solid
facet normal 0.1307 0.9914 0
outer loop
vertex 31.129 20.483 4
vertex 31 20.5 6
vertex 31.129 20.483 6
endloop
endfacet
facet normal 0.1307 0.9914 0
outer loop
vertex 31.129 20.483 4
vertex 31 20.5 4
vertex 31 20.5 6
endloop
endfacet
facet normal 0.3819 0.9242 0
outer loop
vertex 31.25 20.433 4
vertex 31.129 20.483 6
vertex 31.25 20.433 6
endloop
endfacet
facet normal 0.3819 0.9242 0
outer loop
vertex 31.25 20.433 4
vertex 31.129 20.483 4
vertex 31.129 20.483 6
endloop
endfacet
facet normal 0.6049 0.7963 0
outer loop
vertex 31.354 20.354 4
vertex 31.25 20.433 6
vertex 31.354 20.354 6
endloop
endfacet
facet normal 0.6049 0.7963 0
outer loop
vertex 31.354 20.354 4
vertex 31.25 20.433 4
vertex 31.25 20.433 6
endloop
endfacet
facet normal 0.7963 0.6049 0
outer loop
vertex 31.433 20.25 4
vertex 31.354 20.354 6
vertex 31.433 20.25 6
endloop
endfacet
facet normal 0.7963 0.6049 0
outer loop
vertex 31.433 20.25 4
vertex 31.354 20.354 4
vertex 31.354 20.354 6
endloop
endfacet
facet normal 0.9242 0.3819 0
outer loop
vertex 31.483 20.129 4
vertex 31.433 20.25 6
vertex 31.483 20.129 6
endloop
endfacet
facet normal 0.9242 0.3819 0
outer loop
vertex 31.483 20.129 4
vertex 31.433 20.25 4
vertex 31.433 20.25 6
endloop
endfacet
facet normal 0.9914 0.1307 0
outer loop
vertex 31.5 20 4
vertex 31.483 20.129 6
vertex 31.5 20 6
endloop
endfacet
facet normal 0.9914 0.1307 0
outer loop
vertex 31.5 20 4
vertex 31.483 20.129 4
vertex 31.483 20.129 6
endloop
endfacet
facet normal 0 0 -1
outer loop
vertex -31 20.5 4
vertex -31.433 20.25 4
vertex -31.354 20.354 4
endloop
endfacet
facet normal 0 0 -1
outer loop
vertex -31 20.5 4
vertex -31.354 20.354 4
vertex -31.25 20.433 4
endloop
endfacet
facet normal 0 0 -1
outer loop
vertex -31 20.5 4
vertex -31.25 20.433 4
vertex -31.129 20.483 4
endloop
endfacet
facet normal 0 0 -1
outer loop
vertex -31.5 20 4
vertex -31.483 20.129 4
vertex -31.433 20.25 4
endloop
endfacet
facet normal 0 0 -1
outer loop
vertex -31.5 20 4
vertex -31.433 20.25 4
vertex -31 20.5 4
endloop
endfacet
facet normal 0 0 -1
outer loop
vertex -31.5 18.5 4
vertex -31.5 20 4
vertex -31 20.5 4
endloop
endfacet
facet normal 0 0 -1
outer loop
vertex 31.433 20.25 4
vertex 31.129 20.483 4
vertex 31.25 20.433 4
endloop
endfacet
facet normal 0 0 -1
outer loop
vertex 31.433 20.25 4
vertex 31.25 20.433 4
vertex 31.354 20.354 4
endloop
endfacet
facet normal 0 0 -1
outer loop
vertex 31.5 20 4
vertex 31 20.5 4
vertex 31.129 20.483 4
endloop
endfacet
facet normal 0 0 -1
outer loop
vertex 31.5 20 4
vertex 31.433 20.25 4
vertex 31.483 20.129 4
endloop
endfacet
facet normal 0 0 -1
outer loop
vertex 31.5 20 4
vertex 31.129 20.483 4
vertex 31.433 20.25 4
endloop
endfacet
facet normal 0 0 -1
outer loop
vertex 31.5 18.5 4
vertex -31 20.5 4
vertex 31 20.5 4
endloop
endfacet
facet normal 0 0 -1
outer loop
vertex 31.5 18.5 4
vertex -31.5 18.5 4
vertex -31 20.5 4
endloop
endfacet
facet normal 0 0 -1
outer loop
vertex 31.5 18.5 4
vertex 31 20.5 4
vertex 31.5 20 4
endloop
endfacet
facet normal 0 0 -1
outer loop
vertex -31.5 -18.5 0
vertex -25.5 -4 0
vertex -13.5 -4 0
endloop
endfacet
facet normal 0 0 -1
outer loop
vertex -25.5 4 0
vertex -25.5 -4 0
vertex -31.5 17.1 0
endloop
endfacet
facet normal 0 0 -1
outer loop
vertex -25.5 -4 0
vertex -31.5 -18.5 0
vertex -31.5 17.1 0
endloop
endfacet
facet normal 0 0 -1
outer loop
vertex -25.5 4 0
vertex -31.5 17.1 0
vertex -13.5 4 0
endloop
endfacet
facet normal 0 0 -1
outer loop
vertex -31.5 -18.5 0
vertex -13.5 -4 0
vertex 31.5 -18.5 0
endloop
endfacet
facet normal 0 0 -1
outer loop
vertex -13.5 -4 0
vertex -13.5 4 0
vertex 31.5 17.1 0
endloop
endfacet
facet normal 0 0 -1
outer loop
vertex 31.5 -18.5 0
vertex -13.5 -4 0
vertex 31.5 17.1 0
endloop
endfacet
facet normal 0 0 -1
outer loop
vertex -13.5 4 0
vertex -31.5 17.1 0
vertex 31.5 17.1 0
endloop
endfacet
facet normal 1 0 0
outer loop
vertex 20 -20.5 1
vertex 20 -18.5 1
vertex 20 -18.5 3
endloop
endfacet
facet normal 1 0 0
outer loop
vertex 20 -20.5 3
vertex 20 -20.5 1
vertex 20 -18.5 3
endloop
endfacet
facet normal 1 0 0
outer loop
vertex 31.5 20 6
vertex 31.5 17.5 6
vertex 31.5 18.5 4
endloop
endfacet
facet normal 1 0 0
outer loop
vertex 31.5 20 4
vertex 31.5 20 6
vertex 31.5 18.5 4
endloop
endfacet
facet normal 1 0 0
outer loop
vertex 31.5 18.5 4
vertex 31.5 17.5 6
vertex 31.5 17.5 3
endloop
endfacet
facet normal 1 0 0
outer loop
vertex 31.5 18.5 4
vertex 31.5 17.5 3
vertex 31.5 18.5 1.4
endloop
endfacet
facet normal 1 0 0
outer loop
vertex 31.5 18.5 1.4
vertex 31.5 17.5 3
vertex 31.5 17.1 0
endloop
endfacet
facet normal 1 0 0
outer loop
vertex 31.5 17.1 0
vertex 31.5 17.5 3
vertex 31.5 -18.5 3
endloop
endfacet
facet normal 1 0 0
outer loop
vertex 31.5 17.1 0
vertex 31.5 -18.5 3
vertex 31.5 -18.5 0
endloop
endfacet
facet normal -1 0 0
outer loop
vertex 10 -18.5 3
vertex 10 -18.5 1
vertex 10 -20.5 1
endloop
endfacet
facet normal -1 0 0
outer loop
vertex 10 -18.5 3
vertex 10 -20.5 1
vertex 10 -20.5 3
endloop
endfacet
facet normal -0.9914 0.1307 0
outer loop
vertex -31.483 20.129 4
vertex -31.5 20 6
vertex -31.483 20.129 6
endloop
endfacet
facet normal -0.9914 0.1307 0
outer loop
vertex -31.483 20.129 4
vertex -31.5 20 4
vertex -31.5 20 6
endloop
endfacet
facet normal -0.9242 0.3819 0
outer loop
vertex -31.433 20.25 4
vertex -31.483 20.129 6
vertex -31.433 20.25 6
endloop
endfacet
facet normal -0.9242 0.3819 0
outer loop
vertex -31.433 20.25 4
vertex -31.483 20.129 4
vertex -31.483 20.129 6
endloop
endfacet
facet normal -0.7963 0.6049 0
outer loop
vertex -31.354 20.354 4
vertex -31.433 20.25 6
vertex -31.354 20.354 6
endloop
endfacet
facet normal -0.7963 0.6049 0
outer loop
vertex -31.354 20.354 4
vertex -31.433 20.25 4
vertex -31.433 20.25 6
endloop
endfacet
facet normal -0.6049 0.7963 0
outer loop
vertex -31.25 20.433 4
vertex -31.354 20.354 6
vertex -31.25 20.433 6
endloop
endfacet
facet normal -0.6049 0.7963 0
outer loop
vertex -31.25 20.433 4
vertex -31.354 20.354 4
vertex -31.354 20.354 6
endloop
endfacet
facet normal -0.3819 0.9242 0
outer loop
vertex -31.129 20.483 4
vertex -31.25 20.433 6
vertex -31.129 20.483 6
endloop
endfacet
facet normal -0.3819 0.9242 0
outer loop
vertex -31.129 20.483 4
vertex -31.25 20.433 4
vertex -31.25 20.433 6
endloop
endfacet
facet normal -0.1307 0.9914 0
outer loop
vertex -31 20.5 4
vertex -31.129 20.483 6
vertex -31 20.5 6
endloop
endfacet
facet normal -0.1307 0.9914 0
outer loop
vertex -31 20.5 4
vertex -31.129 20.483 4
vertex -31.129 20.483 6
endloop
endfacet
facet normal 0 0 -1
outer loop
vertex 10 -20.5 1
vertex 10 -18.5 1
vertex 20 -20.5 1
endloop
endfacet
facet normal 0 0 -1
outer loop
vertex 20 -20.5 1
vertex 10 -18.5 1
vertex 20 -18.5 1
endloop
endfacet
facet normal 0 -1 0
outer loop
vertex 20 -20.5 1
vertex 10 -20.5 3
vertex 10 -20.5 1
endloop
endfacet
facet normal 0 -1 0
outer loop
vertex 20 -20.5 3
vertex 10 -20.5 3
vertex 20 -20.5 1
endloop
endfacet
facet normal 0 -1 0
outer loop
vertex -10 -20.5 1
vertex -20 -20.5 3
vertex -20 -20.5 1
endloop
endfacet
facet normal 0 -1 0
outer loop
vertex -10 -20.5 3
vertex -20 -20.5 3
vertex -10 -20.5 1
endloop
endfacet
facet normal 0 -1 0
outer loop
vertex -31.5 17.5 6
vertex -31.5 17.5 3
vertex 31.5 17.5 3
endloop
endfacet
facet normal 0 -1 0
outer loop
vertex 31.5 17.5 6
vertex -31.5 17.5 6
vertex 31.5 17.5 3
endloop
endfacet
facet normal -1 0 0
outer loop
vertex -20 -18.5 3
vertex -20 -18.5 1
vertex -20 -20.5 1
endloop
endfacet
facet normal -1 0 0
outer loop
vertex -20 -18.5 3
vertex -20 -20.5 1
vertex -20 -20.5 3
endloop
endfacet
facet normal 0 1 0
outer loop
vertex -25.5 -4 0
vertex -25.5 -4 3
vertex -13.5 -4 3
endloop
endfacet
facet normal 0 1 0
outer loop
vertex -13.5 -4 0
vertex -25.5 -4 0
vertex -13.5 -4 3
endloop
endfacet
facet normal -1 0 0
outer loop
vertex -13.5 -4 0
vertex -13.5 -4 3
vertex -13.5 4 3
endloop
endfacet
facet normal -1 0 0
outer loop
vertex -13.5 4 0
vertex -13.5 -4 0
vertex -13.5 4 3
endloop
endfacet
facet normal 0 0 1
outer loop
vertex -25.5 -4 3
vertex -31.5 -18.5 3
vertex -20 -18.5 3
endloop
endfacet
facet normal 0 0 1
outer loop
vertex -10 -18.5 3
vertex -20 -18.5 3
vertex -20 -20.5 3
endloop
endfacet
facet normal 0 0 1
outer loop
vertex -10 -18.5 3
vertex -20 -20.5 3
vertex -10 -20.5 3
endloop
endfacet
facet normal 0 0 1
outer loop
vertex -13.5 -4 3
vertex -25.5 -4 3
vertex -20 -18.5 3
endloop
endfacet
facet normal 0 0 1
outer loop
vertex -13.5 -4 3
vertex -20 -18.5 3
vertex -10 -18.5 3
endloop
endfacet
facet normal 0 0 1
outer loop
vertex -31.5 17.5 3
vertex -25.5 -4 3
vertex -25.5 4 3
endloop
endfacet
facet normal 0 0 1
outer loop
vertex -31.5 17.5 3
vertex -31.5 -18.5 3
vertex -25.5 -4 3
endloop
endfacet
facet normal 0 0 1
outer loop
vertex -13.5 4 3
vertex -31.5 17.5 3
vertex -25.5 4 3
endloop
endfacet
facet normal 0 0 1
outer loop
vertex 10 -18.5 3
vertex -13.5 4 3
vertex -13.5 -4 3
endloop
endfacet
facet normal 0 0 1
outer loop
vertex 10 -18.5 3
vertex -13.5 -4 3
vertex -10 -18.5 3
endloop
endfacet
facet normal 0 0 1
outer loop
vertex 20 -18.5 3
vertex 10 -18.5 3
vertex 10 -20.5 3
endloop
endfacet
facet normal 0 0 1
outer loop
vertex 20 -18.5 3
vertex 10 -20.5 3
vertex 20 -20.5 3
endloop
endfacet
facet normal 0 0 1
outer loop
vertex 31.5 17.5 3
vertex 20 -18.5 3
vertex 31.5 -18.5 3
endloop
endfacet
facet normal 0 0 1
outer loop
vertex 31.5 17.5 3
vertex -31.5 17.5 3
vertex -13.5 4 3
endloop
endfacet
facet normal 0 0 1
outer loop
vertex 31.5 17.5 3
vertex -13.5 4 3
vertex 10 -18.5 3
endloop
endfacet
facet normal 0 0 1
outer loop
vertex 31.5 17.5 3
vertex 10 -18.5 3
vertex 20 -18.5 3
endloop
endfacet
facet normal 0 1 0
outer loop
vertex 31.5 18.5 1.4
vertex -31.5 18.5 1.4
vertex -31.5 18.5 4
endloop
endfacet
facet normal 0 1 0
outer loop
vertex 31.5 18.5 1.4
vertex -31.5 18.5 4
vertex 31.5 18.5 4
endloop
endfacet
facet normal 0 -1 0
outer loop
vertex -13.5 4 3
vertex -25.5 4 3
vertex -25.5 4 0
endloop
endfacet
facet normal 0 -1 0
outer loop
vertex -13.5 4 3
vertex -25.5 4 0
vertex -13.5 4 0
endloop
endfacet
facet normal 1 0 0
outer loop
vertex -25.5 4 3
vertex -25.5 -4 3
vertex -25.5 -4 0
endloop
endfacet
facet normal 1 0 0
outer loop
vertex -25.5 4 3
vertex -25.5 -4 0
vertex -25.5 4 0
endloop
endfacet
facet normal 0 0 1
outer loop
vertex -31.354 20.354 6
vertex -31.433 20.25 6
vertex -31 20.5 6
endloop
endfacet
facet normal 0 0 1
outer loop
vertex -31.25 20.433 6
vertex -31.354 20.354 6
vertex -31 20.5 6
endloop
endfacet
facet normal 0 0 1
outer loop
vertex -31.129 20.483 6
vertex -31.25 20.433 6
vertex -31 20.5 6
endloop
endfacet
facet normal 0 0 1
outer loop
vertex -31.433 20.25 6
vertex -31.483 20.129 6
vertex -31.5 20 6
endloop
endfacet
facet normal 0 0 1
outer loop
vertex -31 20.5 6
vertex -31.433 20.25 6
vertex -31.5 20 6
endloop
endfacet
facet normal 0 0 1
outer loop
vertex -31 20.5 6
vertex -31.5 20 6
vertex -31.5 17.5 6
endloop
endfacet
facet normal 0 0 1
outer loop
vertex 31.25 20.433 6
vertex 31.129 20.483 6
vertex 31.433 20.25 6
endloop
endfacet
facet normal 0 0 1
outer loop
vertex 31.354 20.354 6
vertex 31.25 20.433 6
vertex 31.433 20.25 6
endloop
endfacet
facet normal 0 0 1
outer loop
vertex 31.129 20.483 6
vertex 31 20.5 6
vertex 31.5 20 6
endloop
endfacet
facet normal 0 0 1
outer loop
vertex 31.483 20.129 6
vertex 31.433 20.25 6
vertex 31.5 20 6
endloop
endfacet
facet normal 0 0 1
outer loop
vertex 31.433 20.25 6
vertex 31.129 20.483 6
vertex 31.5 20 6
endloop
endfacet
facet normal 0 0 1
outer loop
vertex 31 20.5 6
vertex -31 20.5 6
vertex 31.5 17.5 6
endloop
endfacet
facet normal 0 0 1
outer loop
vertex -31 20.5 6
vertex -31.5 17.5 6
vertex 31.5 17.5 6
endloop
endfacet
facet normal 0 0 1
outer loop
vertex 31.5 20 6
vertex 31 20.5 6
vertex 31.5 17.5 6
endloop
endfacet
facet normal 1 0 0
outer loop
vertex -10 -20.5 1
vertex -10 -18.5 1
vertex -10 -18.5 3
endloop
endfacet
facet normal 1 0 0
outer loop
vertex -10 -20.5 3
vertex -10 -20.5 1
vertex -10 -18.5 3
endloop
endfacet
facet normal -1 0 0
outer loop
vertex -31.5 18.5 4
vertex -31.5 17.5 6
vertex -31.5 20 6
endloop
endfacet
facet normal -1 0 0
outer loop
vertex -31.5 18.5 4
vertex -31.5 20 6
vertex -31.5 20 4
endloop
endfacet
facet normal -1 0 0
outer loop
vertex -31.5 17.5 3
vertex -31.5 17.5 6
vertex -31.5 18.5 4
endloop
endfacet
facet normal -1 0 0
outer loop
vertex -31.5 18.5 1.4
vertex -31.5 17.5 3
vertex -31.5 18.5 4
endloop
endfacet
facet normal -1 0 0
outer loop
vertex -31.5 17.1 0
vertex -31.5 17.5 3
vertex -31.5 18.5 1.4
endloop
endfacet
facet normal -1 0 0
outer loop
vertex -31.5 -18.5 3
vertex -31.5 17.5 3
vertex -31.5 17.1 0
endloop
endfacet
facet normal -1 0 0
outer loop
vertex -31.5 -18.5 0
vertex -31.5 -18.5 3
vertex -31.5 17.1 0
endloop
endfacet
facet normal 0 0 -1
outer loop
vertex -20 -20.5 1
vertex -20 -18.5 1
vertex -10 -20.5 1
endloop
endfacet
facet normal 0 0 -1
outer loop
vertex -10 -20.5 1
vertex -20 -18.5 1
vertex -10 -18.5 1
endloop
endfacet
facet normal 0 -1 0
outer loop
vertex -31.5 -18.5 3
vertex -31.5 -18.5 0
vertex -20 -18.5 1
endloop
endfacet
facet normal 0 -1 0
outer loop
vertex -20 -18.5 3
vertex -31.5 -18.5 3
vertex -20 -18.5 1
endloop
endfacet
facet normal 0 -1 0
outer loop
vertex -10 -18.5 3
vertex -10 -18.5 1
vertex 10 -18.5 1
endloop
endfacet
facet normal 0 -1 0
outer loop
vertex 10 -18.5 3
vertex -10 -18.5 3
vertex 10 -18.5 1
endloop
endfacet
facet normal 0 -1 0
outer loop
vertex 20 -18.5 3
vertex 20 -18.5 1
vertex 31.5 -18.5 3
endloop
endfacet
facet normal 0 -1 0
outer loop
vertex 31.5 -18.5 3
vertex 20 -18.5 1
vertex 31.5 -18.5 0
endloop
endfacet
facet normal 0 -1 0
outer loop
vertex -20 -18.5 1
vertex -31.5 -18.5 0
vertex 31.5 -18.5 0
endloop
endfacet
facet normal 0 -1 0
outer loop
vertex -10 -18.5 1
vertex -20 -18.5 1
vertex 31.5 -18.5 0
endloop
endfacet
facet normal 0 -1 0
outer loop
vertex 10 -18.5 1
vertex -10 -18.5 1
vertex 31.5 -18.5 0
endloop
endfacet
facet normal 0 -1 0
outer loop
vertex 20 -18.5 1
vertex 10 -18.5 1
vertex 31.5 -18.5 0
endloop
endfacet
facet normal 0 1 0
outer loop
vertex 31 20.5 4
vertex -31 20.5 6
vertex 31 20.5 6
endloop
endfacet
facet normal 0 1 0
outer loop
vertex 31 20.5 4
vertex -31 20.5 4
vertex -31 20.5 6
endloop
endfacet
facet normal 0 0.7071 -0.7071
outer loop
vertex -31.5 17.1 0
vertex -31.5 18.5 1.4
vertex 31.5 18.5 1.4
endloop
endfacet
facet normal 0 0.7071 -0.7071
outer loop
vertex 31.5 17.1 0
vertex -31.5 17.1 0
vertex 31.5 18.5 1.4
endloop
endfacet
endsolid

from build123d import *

# Parameters (mm, degrees)
SKETCH1_W           = 63
SKETCH1_H           = 37
BOSS_EXTRUDE1_DEPTH = 3
SKETCH2_W           = 10
SKETCH2_H           = 2
BOSS_EXTRUDE2_DEPTH = 2
SKETCH3_W           = 63
SKETCH3_H           = 1
BOSS_EXTRUDE3_DEPTH = 3
SKETCH4_W           = 12
SKETCH4_H           = 8
CUT_EXTRUDE1_DEPTH  = 4
SKETCH5_W           = 63
SKETCH5_H           = 2
BOSS_EXTRUDE4_DEPTH = 2
CHAMFER1_SIZE       = 1.4
FILLET1_R           = 0.5


with BuildPart() as part:
    # Sketch1 → Boss-Extrude1 (new body)
    with BuildSketch(Plane.XY):
        Rectangle(SKETCH1_W, SKETCH1_H)
    extrude(amount=BOSS_EXTRUDE1_DEPTH)

    # Sketch2 → Boss-Extrude2 (add)
    with BuildSketch(Plane.XZ.offset(18.5)):
        with Locations((-15, 2)):
            Rectangle(SKETCH2_W, SKETCH2_H)
        with Locations((15, 2)):
            Rectangle(SKETCH2_W, SKETCH2_H)
    extrude(amount=BOSS_EXTRUDE2_DEPTH)

    # Sketch3 → Boss-Extrude3 (add)
    with BuildSketch(Plane.XY.offset(3)):
        with Locations((0, 18)):
            Rectangle(SKETCH3_W, SKETCH3_H)
    extrude(amount=BOSS_EXTRUDE3_DEPTH)

    # Sketch4 → Cut-Extrude1 (cut, through all)
    with BuildSketch(Plane.XY.offset(3)):
        with Locations((-19.5, 0)):
            Rectangle(SKETCH4_W, SKETCH4_H)
    extrude(amount=-CUT_EXTRUDE1_DEPTH, mode=Mode.SUBTRACT)

    # Sketch5 → Boss-Extrude4 (add)
    with BuildSketch(Plane(origin=(0, 18.5, 0), x_dir=(1, 0, 0), z_dir=(0, 1, 0))):
        with Locations((0, -5)):
            Rectangle(SKETCH5_W, SKETCH5_H)
    extrude(amount=BOSS_EXTRUDE4_DEPTH)

    # Chamfer1
    chamfer1_edges = [part.edges().sort_by_distance(p)[0] for p in [
        (0, 18.5, 0),
    ]]
    chamfer(chamfer1_edges, length=CHAMFER1_SIZE)

    # Fillet1
    fillet1_edges = [part.edges().sort_by_distance(p)[0] for p in [
        (31.5, 20.5, 5),
        (-31.5, 20.5, 5),
    ]]
    fillet(fillet1_edges, radius=FILLET1_R)


solid = part.part
